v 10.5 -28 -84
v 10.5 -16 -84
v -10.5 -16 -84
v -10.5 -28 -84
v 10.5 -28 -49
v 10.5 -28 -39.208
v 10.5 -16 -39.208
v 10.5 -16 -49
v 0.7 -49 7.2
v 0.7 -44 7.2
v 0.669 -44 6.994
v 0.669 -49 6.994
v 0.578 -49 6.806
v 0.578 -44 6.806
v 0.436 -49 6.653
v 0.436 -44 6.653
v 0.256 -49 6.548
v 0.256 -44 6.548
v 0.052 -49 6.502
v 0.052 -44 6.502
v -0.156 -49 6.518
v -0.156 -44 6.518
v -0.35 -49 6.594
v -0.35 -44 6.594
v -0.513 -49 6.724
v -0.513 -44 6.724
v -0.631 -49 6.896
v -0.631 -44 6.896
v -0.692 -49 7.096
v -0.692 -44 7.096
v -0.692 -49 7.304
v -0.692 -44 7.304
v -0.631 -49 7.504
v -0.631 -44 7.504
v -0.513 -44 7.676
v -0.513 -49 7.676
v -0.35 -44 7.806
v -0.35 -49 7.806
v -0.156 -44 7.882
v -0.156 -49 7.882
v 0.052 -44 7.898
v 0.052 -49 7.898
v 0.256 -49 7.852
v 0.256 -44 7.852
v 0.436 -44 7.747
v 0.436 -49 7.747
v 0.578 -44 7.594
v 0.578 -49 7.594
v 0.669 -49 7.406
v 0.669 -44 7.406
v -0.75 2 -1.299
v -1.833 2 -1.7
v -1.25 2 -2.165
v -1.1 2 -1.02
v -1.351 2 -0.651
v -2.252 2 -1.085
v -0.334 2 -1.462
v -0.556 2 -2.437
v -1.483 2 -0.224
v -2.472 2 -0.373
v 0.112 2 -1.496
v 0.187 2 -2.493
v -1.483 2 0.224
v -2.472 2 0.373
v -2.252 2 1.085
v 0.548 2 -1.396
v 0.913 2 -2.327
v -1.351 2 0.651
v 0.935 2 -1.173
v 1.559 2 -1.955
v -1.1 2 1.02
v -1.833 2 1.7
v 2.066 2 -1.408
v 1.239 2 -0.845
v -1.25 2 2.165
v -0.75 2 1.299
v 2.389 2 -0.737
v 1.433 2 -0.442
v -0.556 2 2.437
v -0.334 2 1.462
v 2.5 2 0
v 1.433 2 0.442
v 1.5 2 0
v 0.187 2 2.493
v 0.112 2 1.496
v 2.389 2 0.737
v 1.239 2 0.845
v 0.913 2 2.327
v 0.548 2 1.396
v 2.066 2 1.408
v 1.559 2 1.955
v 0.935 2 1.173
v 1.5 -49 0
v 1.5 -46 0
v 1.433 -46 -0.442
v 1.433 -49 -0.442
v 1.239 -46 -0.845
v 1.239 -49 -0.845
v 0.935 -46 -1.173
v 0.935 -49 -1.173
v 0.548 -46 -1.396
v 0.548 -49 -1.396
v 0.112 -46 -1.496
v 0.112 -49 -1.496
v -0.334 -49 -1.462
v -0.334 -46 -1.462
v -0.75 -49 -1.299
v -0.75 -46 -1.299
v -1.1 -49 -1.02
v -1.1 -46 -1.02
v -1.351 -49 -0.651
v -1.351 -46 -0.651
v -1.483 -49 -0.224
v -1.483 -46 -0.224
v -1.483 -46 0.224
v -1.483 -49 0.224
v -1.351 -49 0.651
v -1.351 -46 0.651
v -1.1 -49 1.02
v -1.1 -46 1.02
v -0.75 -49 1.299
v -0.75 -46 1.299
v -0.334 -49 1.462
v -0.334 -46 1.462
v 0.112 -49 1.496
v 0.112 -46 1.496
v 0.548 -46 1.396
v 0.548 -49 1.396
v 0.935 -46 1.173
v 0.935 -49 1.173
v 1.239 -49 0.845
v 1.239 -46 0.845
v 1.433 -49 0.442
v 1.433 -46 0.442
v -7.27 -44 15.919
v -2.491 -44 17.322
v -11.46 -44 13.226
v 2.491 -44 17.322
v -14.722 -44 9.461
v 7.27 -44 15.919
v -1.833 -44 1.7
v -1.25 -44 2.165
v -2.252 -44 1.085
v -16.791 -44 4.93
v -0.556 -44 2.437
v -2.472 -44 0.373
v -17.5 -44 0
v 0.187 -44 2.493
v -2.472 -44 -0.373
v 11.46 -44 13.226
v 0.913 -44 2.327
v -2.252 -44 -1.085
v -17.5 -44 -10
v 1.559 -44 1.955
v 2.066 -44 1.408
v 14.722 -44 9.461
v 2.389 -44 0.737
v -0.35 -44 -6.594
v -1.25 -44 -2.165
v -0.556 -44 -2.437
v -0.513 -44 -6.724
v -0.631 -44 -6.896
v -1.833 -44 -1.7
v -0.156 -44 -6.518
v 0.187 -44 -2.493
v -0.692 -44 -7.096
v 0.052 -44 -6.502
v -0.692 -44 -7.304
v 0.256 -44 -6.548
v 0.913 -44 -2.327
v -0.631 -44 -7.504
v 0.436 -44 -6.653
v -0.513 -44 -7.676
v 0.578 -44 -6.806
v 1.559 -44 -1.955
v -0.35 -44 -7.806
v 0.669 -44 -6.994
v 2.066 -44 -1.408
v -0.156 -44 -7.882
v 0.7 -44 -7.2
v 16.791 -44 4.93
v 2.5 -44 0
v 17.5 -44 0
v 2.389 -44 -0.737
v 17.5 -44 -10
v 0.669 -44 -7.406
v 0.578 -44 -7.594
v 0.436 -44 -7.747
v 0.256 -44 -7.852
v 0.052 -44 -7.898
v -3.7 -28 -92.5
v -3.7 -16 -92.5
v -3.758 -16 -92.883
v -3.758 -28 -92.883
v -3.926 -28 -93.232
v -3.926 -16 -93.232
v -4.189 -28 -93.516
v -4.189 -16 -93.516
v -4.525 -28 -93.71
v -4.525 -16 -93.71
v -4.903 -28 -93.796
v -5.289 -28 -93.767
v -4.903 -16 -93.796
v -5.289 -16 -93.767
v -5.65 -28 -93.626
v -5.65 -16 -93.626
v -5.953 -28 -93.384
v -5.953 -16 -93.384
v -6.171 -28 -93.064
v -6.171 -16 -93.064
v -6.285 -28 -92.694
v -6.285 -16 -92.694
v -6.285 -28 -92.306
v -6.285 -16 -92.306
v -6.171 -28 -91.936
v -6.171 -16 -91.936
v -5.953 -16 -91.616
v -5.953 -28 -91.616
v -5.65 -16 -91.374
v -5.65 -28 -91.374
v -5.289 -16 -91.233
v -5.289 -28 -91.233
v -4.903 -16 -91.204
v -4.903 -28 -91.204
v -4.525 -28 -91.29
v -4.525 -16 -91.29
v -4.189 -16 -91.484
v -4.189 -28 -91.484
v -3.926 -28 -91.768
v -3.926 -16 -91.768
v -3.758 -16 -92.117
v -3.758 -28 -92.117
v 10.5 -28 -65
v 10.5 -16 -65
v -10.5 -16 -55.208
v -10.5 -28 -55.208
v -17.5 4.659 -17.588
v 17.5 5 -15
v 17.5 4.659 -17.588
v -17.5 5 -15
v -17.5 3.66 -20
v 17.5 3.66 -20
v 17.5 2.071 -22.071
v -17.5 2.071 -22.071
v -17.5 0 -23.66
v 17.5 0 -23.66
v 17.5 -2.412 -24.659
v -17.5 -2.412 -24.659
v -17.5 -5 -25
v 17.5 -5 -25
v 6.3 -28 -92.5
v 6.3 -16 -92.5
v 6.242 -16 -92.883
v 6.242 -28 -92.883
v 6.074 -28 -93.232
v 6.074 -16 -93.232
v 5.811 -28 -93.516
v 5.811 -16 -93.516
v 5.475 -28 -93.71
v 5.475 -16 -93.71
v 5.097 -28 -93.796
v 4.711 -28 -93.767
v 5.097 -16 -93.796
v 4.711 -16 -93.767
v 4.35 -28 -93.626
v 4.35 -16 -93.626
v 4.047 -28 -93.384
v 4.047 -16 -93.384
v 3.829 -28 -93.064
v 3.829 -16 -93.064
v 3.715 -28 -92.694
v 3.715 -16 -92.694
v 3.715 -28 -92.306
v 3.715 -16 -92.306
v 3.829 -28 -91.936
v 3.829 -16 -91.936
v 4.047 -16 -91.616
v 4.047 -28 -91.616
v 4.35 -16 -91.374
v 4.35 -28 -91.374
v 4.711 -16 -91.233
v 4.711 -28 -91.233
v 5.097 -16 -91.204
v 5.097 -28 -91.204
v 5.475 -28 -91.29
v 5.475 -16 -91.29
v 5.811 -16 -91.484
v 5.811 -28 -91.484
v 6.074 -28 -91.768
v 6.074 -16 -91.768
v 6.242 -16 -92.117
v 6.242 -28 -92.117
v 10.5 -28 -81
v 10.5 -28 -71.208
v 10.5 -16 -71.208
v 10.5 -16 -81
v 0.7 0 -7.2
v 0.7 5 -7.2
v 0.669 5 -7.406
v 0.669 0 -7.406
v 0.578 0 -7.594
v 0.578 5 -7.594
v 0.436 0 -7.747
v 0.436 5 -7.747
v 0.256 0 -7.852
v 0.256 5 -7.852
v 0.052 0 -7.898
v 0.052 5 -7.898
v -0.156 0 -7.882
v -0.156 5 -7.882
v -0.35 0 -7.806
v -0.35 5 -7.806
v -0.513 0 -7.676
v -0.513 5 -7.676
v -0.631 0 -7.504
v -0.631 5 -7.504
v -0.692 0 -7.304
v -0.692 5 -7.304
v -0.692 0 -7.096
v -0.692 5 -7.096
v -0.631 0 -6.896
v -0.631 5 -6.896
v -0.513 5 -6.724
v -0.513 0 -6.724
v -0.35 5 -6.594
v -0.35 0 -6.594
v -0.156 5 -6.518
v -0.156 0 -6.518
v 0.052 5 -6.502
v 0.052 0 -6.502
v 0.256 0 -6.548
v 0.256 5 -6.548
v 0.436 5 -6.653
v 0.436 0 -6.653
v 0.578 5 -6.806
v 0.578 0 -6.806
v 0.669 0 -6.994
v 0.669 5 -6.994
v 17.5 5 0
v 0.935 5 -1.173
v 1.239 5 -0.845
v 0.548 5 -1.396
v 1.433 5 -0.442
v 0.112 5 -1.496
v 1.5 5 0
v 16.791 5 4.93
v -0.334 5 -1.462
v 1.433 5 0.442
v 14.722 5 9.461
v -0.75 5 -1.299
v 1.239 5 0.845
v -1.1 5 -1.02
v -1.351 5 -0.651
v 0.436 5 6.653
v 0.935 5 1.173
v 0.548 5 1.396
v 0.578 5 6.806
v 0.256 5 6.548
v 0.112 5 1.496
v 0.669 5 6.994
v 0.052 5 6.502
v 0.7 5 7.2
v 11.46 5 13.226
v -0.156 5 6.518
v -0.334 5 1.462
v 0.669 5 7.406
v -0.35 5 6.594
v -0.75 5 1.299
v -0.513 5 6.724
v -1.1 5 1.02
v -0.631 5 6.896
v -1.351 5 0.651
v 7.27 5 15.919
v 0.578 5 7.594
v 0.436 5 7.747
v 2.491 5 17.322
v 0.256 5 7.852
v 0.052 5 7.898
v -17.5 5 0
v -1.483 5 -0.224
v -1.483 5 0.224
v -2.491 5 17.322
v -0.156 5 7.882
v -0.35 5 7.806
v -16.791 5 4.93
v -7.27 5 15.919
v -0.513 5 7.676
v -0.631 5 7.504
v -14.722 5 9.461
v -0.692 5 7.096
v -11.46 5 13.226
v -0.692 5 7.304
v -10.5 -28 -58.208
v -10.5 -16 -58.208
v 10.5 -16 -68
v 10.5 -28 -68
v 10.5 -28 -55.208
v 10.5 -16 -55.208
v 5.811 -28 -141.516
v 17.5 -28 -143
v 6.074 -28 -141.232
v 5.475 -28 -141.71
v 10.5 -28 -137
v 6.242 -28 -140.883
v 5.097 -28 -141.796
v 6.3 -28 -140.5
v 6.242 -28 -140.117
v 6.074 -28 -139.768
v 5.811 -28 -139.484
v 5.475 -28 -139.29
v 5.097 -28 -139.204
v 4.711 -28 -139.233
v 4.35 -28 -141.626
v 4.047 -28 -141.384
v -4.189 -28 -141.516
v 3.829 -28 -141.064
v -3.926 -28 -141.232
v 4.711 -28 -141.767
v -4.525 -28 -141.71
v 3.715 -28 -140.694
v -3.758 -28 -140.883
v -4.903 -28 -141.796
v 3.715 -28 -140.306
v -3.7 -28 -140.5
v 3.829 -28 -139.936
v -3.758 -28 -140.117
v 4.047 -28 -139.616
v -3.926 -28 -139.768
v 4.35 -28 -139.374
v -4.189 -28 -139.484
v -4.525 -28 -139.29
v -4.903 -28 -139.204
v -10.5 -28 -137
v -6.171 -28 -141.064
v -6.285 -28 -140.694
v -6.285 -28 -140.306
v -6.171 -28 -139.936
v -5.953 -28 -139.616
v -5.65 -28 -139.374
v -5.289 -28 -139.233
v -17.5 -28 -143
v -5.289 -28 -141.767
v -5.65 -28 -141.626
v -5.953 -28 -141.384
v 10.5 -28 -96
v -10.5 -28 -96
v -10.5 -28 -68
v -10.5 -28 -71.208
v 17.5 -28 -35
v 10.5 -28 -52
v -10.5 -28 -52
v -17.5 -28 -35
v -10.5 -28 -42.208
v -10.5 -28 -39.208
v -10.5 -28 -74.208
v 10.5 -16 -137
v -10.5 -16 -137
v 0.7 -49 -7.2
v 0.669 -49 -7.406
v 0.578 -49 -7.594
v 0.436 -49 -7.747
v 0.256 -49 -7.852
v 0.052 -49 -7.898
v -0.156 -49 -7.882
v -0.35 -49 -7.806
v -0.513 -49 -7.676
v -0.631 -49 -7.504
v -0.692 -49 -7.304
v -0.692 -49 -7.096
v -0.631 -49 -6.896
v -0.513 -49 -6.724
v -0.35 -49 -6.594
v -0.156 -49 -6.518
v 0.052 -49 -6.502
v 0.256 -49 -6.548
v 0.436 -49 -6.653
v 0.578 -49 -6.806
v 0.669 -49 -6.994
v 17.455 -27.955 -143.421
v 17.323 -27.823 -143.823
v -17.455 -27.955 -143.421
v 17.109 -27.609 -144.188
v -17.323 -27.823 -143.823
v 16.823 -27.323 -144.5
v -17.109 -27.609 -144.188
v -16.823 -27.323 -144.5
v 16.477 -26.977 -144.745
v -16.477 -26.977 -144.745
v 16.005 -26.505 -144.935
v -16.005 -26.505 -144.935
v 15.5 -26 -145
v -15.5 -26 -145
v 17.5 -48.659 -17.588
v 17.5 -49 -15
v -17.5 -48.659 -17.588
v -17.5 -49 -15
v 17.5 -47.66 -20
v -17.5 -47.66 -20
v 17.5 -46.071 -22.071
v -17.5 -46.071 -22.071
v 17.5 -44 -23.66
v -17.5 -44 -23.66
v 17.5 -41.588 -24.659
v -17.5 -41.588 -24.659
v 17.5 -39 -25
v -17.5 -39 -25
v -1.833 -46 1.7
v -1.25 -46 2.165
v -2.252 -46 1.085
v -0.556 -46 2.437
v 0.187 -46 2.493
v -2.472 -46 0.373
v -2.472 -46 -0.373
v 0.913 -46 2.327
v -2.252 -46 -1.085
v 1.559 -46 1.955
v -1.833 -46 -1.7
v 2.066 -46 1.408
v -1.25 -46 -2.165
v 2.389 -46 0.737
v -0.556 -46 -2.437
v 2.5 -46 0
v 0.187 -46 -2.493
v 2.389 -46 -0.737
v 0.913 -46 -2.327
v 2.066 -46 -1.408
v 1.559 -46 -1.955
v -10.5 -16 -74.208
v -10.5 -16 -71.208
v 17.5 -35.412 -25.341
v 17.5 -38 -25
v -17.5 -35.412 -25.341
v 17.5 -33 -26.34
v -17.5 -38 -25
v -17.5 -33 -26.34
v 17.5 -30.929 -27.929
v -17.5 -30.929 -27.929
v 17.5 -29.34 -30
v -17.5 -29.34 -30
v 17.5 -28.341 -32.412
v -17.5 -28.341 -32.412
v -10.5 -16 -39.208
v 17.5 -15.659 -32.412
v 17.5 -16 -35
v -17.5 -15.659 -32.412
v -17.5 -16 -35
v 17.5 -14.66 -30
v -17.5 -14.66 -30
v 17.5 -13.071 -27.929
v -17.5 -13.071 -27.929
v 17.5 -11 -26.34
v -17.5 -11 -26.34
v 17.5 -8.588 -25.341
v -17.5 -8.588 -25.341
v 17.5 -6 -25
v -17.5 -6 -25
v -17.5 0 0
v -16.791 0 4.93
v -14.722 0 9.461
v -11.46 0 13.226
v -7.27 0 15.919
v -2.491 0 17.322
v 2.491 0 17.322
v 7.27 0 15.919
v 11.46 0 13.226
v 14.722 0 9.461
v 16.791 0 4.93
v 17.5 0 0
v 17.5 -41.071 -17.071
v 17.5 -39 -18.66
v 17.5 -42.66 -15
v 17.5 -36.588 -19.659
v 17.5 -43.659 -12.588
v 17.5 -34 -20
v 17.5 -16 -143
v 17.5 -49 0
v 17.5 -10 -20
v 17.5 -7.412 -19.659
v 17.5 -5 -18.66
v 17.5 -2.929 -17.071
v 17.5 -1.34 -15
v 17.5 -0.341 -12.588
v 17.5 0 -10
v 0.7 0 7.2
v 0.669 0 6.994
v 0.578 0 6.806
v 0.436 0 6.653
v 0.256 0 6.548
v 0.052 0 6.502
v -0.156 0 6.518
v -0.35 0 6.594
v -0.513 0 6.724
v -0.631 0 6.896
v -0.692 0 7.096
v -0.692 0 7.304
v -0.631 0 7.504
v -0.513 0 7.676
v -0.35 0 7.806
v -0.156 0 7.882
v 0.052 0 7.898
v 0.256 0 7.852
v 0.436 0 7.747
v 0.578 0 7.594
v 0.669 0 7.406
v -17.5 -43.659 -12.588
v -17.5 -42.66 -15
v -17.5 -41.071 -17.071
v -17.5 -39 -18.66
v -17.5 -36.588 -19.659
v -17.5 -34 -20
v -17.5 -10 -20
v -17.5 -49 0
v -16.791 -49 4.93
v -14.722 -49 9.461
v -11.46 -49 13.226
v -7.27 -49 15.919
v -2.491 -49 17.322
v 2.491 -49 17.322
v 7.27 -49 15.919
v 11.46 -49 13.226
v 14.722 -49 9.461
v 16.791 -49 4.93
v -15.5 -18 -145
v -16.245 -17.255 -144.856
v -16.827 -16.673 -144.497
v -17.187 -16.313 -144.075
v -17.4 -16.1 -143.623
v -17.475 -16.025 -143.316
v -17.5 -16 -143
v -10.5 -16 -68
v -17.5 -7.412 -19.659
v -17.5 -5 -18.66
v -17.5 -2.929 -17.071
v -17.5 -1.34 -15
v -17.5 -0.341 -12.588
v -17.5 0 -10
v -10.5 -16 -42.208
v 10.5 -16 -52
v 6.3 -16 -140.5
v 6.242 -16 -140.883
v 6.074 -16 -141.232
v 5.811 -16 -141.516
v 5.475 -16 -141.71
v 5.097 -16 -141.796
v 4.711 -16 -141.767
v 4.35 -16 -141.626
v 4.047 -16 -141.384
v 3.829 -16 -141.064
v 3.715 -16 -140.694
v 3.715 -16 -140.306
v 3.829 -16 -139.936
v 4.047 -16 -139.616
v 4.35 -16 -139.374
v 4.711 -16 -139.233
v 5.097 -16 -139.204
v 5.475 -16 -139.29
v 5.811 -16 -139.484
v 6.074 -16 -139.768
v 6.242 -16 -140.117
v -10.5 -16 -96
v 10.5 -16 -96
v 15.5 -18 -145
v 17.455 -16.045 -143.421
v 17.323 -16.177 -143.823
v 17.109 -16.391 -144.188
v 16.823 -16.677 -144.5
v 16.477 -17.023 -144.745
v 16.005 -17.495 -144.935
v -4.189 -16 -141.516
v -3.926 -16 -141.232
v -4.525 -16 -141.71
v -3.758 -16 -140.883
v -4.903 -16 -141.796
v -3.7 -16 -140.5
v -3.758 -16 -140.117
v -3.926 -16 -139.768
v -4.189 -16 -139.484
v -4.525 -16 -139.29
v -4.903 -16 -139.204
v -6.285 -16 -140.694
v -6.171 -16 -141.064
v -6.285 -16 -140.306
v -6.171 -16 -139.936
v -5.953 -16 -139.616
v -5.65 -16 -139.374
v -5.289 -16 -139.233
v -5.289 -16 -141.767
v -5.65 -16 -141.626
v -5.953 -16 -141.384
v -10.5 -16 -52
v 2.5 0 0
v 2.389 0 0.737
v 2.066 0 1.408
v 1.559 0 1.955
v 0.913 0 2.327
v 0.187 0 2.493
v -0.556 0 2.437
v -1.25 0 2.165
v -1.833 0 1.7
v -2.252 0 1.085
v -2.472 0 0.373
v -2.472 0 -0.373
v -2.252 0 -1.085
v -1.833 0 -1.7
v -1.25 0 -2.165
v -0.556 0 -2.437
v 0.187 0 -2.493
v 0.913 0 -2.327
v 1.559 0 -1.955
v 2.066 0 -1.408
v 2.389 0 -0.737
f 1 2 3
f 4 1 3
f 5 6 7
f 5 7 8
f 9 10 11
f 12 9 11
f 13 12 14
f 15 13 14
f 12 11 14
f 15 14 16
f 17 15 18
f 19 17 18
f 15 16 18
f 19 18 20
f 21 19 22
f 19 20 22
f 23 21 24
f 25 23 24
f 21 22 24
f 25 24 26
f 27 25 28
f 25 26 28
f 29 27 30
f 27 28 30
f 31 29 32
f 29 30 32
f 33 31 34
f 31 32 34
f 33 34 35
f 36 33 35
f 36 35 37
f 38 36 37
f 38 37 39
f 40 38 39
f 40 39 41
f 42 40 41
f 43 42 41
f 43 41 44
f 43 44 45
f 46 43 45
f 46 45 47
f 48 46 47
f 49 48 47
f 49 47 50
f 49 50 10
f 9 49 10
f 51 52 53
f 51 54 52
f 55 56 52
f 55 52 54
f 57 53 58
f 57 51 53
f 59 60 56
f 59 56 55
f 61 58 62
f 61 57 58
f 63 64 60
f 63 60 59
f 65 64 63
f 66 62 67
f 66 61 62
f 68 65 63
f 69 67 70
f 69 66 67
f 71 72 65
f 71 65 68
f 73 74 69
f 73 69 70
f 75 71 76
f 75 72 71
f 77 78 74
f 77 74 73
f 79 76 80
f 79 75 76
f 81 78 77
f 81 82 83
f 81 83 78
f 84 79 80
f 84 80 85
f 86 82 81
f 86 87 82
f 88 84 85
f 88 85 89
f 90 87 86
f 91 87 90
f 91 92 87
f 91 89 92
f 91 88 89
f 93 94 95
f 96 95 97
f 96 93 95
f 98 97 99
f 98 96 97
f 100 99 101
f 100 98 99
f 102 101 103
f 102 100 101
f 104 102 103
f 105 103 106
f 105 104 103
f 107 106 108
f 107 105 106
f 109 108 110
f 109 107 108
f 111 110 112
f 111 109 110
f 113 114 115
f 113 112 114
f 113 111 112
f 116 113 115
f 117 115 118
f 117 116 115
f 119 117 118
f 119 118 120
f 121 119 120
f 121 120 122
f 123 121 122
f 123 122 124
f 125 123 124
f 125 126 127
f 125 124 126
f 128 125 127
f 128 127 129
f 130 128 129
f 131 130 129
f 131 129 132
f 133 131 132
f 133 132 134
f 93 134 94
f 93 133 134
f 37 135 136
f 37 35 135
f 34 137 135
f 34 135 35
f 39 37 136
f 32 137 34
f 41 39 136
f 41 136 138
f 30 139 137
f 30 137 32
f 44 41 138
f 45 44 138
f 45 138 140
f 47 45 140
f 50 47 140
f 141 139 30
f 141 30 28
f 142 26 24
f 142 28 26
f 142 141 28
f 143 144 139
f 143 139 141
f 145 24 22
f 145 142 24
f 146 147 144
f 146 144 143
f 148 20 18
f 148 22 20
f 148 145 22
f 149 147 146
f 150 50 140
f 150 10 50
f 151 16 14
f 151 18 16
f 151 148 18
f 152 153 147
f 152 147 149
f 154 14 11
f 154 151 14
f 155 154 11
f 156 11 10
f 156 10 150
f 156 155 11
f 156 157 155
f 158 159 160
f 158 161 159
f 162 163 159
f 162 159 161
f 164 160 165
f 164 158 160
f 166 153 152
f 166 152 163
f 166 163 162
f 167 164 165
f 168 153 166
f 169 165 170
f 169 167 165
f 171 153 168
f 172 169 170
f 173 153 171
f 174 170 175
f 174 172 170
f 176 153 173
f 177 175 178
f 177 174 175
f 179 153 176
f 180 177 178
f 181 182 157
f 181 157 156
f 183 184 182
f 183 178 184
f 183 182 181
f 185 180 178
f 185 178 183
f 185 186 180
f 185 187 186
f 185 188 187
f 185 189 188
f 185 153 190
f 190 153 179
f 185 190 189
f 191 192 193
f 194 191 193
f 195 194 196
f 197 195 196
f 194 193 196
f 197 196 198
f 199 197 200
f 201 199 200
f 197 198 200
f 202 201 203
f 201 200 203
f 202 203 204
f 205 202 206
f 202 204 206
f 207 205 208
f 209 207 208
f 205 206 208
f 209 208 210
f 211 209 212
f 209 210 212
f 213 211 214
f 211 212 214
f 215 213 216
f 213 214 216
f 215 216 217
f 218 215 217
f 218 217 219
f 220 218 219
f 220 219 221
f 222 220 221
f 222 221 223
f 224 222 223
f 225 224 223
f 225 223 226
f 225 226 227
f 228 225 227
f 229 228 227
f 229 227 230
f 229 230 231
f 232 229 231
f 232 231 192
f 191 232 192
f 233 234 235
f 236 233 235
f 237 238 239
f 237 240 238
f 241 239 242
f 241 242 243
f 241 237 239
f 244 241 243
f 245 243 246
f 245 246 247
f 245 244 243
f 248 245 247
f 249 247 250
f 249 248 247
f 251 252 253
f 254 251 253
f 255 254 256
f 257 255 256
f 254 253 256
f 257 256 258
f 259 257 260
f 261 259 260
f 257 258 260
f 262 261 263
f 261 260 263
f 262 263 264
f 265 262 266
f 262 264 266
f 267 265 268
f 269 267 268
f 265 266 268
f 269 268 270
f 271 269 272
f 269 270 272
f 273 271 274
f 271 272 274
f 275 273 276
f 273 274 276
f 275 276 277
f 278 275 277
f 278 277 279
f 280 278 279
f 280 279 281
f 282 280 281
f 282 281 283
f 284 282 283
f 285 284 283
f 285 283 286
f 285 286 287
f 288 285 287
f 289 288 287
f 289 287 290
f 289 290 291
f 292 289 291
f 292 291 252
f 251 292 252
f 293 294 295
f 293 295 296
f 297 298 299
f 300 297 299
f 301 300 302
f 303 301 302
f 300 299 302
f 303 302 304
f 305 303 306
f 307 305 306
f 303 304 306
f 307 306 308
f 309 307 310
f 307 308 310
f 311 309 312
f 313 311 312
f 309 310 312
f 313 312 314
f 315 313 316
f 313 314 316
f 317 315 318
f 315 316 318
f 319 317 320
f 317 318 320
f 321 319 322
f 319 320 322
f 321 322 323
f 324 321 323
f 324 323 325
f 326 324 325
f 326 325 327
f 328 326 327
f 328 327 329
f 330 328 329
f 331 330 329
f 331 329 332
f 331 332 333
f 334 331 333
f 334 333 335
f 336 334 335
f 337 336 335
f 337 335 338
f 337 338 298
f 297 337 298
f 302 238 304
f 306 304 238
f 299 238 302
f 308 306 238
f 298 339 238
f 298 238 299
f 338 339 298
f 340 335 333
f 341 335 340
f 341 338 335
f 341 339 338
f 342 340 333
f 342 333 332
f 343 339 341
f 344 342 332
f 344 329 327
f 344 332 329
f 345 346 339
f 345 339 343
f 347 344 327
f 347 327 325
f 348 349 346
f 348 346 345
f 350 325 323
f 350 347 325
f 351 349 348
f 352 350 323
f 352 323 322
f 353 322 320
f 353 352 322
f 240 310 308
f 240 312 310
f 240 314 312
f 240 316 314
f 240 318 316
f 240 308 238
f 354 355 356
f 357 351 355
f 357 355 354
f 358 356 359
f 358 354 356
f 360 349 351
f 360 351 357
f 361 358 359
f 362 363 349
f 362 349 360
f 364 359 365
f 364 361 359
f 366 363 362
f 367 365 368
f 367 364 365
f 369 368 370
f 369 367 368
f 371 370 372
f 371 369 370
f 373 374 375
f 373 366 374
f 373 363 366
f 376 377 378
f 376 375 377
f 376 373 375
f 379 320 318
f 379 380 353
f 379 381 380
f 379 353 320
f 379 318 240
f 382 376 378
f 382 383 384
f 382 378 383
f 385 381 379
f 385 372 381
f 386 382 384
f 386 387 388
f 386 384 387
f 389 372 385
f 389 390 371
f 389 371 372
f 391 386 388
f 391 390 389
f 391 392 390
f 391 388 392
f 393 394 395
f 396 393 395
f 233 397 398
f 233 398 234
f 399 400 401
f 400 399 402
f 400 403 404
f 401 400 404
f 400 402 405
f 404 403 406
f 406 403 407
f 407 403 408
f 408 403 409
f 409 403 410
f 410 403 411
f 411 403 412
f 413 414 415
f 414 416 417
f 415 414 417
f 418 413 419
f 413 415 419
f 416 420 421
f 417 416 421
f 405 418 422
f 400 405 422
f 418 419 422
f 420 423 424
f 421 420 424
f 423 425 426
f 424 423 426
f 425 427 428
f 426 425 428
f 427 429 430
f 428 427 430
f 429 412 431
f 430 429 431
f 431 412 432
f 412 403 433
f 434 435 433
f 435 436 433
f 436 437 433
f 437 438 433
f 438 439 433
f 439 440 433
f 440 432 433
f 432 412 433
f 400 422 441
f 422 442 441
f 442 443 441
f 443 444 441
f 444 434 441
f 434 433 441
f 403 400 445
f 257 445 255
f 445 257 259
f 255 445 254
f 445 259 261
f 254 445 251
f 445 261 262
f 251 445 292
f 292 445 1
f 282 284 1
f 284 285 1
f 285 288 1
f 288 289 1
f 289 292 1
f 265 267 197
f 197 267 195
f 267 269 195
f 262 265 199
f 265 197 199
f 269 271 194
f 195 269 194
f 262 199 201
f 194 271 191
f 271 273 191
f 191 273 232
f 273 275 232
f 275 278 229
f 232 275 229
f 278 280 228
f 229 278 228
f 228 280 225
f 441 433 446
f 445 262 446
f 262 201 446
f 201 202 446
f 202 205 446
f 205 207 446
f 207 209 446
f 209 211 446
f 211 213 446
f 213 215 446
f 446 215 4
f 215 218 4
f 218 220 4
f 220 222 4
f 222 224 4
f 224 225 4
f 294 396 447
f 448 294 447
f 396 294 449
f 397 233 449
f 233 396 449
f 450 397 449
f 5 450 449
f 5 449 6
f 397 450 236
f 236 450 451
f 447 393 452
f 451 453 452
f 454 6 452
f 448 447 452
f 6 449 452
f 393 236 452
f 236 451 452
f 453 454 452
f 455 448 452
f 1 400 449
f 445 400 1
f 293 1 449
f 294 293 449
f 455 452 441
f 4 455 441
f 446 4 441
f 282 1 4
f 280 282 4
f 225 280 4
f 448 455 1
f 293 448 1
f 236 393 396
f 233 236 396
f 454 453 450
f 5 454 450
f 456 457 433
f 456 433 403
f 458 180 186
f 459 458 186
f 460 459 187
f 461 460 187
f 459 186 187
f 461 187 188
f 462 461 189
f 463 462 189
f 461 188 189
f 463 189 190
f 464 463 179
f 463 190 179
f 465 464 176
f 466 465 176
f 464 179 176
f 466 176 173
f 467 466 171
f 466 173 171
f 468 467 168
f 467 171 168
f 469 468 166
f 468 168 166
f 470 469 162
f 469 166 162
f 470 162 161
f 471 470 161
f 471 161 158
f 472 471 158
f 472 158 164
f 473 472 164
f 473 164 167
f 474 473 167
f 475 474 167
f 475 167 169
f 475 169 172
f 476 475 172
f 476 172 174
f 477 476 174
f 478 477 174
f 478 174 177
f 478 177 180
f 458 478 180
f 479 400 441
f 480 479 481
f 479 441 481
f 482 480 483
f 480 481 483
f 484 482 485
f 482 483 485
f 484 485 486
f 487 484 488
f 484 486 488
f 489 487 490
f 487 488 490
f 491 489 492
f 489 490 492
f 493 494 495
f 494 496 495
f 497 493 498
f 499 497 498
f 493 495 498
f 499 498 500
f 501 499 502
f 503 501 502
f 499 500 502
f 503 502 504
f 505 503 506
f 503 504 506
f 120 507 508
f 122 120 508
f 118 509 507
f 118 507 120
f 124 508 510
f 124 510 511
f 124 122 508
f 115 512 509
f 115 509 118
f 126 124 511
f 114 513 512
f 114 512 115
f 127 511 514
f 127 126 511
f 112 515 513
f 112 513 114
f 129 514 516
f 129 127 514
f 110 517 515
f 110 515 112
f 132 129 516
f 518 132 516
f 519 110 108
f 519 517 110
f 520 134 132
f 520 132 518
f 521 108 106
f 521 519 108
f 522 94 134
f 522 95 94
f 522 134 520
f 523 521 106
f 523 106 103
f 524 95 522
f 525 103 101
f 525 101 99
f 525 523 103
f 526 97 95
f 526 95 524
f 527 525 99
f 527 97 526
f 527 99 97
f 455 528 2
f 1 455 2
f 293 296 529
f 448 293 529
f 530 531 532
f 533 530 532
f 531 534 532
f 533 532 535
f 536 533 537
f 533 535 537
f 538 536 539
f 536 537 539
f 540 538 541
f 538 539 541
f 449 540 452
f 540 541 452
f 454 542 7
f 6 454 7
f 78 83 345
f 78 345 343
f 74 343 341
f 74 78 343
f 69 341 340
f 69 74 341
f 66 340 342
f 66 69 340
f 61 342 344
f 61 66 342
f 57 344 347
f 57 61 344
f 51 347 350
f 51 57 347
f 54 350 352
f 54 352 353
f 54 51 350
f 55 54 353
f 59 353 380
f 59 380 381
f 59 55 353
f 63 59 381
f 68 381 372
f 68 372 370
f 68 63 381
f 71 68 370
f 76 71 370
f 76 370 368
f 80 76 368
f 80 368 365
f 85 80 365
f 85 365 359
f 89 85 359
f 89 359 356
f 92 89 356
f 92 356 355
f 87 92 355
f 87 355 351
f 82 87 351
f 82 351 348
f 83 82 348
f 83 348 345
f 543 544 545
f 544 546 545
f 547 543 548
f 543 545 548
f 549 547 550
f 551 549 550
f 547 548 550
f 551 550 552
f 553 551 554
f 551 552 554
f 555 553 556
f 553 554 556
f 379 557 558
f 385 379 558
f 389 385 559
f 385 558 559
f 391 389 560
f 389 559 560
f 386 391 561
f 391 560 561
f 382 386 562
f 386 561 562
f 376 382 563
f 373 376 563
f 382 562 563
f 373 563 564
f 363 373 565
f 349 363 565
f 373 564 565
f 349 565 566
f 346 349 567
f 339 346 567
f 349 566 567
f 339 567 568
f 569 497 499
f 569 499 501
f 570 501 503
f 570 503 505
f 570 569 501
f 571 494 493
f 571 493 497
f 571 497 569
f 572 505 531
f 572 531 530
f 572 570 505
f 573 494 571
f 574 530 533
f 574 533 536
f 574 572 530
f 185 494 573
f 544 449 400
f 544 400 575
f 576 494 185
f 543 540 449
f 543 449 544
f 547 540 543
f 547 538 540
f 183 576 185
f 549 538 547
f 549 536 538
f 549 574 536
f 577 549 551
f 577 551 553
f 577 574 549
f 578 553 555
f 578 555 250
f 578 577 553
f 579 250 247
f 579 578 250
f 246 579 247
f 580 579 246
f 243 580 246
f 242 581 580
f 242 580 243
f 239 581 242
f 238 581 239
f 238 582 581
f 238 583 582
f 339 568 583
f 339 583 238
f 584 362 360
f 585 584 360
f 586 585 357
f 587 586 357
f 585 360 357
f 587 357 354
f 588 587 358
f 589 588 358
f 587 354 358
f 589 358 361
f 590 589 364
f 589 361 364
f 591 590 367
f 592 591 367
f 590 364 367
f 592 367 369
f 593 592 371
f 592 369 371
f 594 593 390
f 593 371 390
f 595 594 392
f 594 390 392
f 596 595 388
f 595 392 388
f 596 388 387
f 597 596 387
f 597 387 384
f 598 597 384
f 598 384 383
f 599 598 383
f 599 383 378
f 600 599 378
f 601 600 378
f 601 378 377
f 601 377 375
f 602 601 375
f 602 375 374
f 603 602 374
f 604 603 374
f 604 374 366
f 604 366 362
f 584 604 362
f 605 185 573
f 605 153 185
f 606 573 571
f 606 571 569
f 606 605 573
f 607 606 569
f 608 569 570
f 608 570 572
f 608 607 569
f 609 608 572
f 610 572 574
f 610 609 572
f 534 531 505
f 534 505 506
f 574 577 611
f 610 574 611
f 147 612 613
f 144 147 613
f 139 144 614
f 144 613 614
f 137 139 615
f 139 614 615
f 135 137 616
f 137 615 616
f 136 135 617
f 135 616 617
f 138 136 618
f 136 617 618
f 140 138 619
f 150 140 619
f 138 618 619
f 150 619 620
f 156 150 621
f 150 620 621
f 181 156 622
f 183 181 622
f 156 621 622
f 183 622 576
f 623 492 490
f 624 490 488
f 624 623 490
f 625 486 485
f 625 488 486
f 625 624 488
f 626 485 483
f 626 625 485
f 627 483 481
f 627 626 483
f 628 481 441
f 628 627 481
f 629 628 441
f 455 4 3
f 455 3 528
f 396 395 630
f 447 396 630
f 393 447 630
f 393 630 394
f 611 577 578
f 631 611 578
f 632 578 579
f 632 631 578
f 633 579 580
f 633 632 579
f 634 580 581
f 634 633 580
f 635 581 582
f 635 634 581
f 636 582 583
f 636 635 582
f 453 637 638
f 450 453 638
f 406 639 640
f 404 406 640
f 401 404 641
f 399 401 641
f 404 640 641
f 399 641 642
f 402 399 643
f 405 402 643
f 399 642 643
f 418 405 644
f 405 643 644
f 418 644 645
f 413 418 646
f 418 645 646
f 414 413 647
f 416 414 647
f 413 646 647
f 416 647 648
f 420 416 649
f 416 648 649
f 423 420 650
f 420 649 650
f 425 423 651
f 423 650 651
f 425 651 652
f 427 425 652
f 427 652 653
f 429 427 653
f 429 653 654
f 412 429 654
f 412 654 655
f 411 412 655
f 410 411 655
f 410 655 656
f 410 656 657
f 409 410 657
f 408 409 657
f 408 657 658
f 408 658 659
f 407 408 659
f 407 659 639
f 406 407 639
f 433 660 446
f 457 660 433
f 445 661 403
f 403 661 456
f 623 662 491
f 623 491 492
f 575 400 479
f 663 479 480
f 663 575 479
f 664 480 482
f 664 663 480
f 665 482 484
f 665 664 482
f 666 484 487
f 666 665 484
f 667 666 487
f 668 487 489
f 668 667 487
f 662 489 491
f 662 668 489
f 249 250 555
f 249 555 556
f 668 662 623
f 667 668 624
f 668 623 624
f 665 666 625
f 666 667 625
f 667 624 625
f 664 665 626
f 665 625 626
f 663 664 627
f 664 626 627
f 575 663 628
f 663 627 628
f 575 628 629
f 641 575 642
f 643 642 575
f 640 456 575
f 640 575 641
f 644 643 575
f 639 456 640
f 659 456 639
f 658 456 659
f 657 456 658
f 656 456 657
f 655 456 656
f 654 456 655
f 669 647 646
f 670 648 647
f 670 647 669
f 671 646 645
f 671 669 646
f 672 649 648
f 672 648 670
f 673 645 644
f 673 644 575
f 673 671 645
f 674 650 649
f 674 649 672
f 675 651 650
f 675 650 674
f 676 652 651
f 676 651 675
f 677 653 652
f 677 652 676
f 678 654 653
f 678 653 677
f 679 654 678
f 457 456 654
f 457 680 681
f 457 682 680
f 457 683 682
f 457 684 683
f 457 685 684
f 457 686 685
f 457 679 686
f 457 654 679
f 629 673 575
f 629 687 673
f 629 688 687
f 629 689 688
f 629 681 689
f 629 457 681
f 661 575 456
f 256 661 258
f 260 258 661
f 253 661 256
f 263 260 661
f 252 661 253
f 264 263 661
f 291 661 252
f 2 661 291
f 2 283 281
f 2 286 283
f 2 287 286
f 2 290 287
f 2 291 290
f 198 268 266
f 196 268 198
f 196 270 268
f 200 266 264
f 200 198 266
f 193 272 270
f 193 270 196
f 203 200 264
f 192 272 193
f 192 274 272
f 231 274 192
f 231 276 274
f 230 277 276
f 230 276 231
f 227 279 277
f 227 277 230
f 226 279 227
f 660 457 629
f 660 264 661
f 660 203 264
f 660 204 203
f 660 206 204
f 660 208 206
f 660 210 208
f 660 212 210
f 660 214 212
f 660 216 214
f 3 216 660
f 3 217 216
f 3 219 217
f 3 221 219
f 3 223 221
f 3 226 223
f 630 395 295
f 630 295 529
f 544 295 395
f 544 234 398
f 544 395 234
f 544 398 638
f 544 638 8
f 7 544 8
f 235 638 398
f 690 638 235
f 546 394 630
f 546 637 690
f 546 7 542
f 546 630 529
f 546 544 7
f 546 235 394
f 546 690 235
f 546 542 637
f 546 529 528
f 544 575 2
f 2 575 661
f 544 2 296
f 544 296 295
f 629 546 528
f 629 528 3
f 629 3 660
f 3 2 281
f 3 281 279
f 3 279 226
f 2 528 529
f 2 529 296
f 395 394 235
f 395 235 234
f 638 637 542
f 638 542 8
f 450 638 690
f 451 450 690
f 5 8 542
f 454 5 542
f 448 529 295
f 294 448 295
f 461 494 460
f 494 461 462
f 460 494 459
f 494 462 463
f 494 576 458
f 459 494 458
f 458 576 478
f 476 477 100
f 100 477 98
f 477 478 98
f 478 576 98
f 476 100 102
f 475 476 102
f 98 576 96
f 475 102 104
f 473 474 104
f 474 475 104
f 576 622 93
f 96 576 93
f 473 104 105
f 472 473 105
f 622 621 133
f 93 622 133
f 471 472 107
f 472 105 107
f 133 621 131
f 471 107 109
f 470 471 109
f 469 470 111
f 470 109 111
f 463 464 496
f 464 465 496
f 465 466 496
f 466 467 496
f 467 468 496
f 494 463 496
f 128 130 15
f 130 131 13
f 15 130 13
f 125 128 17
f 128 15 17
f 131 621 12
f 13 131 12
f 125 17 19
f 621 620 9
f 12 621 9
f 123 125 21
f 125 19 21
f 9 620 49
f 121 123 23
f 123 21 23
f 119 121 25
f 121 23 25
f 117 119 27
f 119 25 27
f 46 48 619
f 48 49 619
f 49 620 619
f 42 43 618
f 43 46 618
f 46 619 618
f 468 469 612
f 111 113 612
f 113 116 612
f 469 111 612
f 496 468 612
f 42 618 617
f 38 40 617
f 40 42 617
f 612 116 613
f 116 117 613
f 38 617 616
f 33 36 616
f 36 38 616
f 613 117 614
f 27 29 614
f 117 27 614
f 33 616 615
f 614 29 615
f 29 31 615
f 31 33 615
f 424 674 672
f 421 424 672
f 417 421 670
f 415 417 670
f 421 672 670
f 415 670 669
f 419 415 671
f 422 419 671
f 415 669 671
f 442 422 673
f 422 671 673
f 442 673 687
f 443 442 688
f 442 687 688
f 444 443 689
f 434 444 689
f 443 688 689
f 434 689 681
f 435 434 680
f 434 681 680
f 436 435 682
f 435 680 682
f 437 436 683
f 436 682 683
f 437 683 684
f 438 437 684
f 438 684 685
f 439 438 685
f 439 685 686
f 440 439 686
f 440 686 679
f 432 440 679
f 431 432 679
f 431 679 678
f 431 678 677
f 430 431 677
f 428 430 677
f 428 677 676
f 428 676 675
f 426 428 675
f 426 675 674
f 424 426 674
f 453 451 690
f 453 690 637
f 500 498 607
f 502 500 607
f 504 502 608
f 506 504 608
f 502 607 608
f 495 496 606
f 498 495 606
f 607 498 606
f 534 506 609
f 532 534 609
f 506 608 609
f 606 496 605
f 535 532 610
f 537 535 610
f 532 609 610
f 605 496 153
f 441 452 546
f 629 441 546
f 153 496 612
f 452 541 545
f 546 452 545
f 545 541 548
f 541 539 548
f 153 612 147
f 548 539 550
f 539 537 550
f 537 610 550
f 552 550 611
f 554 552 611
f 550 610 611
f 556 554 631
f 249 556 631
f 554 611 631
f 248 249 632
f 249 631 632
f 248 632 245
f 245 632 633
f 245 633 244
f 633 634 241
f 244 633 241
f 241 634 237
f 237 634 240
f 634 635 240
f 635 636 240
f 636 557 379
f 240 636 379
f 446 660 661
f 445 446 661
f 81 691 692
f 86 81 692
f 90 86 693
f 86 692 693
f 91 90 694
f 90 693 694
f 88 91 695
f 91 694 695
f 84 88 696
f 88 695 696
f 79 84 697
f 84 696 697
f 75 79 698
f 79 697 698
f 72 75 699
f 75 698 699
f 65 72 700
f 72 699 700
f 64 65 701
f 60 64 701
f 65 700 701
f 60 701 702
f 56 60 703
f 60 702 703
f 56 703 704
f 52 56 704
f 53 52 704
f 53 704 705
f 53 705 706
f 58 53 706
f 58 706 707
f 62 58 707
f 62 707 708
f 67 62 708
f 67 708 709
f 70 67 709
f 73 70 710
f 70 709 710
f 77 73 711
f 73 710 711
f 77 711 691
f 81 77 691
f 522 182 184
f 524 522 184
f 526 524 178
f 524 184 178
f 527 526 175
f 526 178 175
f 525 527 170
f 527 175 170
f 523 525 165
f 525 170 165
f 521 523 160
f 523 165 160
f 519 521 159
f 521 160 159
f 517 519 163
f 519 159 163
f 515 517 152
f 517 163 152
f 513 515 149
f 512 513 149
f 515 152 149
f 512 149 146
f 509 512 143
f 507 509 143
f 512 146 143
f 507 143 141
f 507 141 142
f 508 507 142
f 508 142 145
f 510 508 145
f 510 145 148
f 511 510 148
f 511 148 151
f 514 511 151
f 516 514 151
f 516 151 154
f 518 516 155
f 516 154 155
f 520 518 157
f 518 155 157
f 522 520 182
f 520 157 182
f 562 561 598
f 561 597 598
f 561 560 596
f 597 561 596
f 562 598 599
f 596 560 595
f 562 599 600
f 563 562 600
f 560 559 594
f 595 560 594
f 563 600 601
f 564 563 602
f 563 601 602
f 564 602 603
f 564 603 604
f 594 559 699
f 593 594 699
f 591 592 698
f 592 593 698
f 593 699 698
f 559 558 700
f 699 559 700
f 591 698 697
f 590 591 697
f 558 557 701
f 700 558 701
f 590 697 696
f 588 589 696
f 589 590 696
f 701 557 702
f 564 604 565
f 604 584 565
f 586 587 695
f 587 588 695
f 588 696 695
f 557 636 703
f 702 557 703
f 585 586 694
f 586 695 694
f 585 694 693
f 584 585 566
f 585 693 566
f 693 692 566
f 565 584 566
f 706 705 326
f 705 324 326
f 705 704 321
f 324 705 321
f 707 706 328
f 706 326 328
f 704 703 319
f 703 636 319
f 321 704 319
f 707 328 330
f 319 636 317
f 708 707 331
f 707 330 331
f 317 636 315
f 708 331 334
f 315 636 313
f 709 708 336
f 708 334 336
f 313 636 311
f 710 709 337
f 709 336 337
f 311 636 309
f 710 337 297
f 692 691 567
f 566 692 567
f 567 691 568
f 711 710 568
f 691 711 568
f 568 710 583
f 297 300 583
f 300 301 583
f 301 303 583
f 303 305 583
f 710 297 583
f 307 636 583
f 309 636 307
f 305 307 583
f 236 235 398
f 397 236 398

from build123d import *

# Parameters (mm, degrees)
SKETCH1_R           = 17.5
SKETCH1_R_2         = 1.5
BOSS_EXTRUDE1_DEPTH = 5
SKETCH3_R           = 1.5
BOSS_EXTRUDE2_DEPTH = 5
SKETCH4_W           = 35
SKETCH4_H           = 54
BOSS_EXTRUDE3_DEPTH = 5
FILLET1_R           = 10
SKETCH6_W           = 35
SKETCH6_H           = 12
BOSS_EXTRUDE4_DEPTH = 120
CUT_EXTRUDE1_REACH  = 35
SKETCH7_R           = 1.3
SKETCH7_W           = 21
SKETCH7_H           = 41
CUT_EXTRUDE2_DEPTH  = 12
LPATTERN1_COUNT     = 3
LPATTERN1_PITCH     = 16
FILLET2_R           = 10
FILLET3_R           = 2
SKETCH11_R          = 0.7
SKETCH11_R_2        = 1.5
CUT_EXTRUDE3_DEPTH  = 55
SKETCH12_R          = 2.5
CUT_EXTRUDE4_DEPTH  = 2
SKETCH13_R          = 2.5
CUT_EXTRUDE5_DEPTH  = 2


with BuildPart() as part:
    # Sketch1 → Boss-Extrude1 (new body)
    with BuildSketch(Plane(origin=(0, 0, 0), x_dir=(1, 0, 0), z_dir=(0, 1, 0))):
        Circle(SKETCH1_R)
        Circle(SKETCH1_R_2, mode=Mode.SUBTRACT)
        with BuildLine():
            Line((-17.5, 20), (-17.5, 0))
            ThreePointArc((-17.5, 0), (0, 17.5), (17.5, 0))
            Line((17.5, 0), (17.5, 20))
            Line((17.5, 20), (-17.5, 20))
        make_face()
    extrude(amount=BOSS_EXTRUDE1_DEPTH)



with BuildPart() as body_2:
    # Sketch3 → Boss-Extrude2 (new body)
    with BuildSketch(Plane(origin=(0, -49, 0), x_dir=(1, 0, 0), z_dir=(0, 1, 0))):
        with BuildLine():
            Line((17.5, 0), (17.5, 20))
            Line((17.5, 20), (-17.5, 20))
            Line((-17.5, 20), (-17.5, 0))
            ThreePointArc((-17.5, 0), (0, -17.5), (17.5, 0))
        make_face()
        Circle(SKETCH3_R, mode=Mode.SUBTRACT)
    extrude(amount=BOSS_EXTRUDE2_DEPTH)


with BuildPart() as part_1:
    add(part.part)

    add(body_2.part)  # Boss-Extrude3 merges body 2
    # Sketch4 → Boss-Extrude3 (add)
    with BuildSketch(Plane(origin=(0, 0, -20), x_dir=(-1, 0, 0), z_dir=(0, 0, -1))):
        with Locations((0, -22)):
            Rectangle(SKETCH4_W, SKETCH4_H)
    extrude(amount=BOSS_EXTRUDE3_DEPTH)

    # Fillet1
    fillet1_edges = [part_1.edges().sort_by_distance(p)[0] for p in [
        (0, -49, -25),
        (0, 5, -25),
        (0, -44, -20),
        (0, 0, -20),
    ]]
    fillet(fillet1_edges, radius=FILLET1_R)

    # Sketch6 → Boss-Extrude4 (add)
    with BuildSketch(Plane(origin=(0, 0, -25), x_dir=(-1, 0, 0), z_dir=(0, 0, -1))):
        with Locations((0, -22)):
            Rectangle(SKETCH6_W, SKETCH6_H)
    extrude(amount=BOSS_EXTRUDE4_DEPTH)

    # Sketch7 → Cut-Extrude1 (cut, up to next)
    with BuildSketch(Plane(origin=(0, -16, 0), x_dir=(1, 0, 0), z_dir=(0, 1, 0)), mode=Mode.PRIVATE) as cut_extrude1_sk1:
        with Locations((-5, 140.5)):
            Circle(SKETCH7_R)
    cut_extrude1_tool1 = extrude(cut_extrude1_sk1.sketch, amount=-CUT_EXTRUDE1_REACH, mode=Mode.PRIVATE) & part_1.part
    add(cut_extrude1_tool1.solids().sort_by_distance((-5, -16, -140.5))[0], mode=Mode.SUBTRACT)
    # Sketch7 → Cut-Extrude1 (cut, up to next)
    with BuildSketch(Plane(origin=(0, -16, 0), x_dir=(1, 0, 0), z_dir=(0, 1, 0)), mode=Mode.PRIVATE) as cut_extrude1_sk2:
        with Locations((5, 140.5)):
            Circle(SKETCH7_R)
    cut_extrude1_tool2 = extrude(cut_extrude1_sk2.sketch, amount=-CUT_EXTRUDE1_REACH, mode=Mode.PRIVATE) & part_1.part
    add(cut_extrude1_tool2.solids().sort_by_distance((5, -16, -140.5))[0], mode=Mode.SUBTRACT)
    # Sketch7 → Cut-Extrude1 (cut, up to next)
    with BuildSketch(Plane(origin=(0, -16, 0), x_dir=(1, 0, 0), z_dir=(0, 1, 0)), mode=Mode.PRIVATE) as cut_extrude1_sk3:
        with Locations((5, 92.5)):
            Circle(SKETCH7_R)
    cut_extrude1_tool3 = extrude(cut_extrude1_sk3.sketch, amount=-CUT_EXTRUDE1_REACH, mode=Mode.PRIVATE) & part_1.part
    add(cut_extrude1_tool3.solids().sort_by_distance((5, -16, -92.5))[0], mode=Mode.SUBTRACT)
    # Sketch7 → Cut-Extrude1 (cut, up to next)
    with BuildSketch(Plane(origin=(0, -16, 0), x_dir=(1, 0, 0), z_dir=(0, 1, 0)), mode=Mode.PRIVATE) as cut_extrude1_sk4:
        with Locations((-5, 92.5)):
            Circle(SKETCH7_R)
    cut_extrude1_tool4 = extrude(cut_extrude1_sk4.sketch, amount=-CUT_EXTRUDE1_REACH, mode=Mode.PRIVATE) & part_1.part
    add(cut_extrude1_tool4.solids().sort_by_distance((-5, -16, -92.5))[0], mode=Mode.SUBTRACT)
    # Sketch7 → Cut-Extrude1 (cut, up to next)
    with BuildSketch(Plane(origin=(0, -16, 0), x_dir=(1, 0, 0), z_dir=(0, 1, 0)), mode=Mode.PRIVATE) as cut_extrude1_sk5:
        with Locations((0, 116.5)):
            Rectangle(SKETCH7_W, SKETCH7_H)
    cut_extrude1_tool5 = extrude(cut_extrude1_sk5.sketch, amount=-CUT_EXTRUDE1_REACH, mode=Mode.PRIVATE) & part_1.part
    add(cut_extrude1_tool5.solids().sort_by_distance((0, -16, -116.5))[0], mode=Mode.SUBTRACT)

    # Sketch8 → Cut-Extrude2 (cut)
    with BuildSketch(Plane(origin=(0, -16, 0), x_dir=(1, 0, 0), z_dir=(0, 1, 0))):
        Polygon((10.5, 84), (-10.5, 84), (-10.5, 74.207539179), align=None)
        Polygon((10.5, 71.207539179), (10.5, 81), (-10.5, 71.207539179), align=None)
    cut_extrude2 = extrude(amount=-CUT_EXTRUDE2_DEPTH, mode=Mode.SUBTRACT)

    # LPattern1: Cut-Extrude2 ×3
    with Locations(*[(0, 0, i * LPATTERN1_PITCH) for i in range(1, LPATTERN1_COUNT)]):
        add(cut_extrude2, mode=Mode.SUBTRACT)

    # Fillet2
    fillet2_edges = [part_1.edges().sort_by_distance(p)[0] for p in [
        (0, -28, -25),
        (0, -16, -25),
    ]]
    fillet(fillet2_edges, radius=FILLET2_R)

    # Fillet3
    fillet3_edges = [part_1.edges().sort_by_distance(p)[0] for p in [
        (17.5, -22, -145),
        (0, -28, -145),
        (-17.5, -22, -145),
        (0, -16, -145),
    ]]
    fillet(fillet3_edges, radius=FILLET3_R)

    # Sketch11 → Cut-Extrude3 (cut, through all)
    with BuildSketch(Plane(origin=(0, 5, 0), x_dir=(1, 0, 0), z_dir=(0, 1, 0))):
        with Locations((0, 7.2)):
            Circle(SKETCH11_R)
        Circle(SKETCH11_R_2)
        with Locations((0, -7.2)):
            Circle(SKETCH11_R)
    extrude(amount=-CUT_EXTRUDE3_DEPTH, mode=Mode.SUBTRACT)

    # Sketch12 → Cut-Extrude4 (cut)
    with BuildSketch(Plane.XZ):
        Circle(SKETCH12_R)
    extrude(amount=-CUT_EXTRUDE4_DEPTH, mode=Mode.SUBTRACT)

    # Sketch13 → Cut-Extrude5 (cut)
    with BuildSketch(Plane(origin=(0, -44, 0), x_dir=(1, 0, 0), z_dir=(0, 1, 0))):
        Circle(SKETCH13_R)
    extrude(amount=-CUT_EXTRUDE5_DEPTH, mode=Mode.SUBTRACT)


solid = part_1.part
